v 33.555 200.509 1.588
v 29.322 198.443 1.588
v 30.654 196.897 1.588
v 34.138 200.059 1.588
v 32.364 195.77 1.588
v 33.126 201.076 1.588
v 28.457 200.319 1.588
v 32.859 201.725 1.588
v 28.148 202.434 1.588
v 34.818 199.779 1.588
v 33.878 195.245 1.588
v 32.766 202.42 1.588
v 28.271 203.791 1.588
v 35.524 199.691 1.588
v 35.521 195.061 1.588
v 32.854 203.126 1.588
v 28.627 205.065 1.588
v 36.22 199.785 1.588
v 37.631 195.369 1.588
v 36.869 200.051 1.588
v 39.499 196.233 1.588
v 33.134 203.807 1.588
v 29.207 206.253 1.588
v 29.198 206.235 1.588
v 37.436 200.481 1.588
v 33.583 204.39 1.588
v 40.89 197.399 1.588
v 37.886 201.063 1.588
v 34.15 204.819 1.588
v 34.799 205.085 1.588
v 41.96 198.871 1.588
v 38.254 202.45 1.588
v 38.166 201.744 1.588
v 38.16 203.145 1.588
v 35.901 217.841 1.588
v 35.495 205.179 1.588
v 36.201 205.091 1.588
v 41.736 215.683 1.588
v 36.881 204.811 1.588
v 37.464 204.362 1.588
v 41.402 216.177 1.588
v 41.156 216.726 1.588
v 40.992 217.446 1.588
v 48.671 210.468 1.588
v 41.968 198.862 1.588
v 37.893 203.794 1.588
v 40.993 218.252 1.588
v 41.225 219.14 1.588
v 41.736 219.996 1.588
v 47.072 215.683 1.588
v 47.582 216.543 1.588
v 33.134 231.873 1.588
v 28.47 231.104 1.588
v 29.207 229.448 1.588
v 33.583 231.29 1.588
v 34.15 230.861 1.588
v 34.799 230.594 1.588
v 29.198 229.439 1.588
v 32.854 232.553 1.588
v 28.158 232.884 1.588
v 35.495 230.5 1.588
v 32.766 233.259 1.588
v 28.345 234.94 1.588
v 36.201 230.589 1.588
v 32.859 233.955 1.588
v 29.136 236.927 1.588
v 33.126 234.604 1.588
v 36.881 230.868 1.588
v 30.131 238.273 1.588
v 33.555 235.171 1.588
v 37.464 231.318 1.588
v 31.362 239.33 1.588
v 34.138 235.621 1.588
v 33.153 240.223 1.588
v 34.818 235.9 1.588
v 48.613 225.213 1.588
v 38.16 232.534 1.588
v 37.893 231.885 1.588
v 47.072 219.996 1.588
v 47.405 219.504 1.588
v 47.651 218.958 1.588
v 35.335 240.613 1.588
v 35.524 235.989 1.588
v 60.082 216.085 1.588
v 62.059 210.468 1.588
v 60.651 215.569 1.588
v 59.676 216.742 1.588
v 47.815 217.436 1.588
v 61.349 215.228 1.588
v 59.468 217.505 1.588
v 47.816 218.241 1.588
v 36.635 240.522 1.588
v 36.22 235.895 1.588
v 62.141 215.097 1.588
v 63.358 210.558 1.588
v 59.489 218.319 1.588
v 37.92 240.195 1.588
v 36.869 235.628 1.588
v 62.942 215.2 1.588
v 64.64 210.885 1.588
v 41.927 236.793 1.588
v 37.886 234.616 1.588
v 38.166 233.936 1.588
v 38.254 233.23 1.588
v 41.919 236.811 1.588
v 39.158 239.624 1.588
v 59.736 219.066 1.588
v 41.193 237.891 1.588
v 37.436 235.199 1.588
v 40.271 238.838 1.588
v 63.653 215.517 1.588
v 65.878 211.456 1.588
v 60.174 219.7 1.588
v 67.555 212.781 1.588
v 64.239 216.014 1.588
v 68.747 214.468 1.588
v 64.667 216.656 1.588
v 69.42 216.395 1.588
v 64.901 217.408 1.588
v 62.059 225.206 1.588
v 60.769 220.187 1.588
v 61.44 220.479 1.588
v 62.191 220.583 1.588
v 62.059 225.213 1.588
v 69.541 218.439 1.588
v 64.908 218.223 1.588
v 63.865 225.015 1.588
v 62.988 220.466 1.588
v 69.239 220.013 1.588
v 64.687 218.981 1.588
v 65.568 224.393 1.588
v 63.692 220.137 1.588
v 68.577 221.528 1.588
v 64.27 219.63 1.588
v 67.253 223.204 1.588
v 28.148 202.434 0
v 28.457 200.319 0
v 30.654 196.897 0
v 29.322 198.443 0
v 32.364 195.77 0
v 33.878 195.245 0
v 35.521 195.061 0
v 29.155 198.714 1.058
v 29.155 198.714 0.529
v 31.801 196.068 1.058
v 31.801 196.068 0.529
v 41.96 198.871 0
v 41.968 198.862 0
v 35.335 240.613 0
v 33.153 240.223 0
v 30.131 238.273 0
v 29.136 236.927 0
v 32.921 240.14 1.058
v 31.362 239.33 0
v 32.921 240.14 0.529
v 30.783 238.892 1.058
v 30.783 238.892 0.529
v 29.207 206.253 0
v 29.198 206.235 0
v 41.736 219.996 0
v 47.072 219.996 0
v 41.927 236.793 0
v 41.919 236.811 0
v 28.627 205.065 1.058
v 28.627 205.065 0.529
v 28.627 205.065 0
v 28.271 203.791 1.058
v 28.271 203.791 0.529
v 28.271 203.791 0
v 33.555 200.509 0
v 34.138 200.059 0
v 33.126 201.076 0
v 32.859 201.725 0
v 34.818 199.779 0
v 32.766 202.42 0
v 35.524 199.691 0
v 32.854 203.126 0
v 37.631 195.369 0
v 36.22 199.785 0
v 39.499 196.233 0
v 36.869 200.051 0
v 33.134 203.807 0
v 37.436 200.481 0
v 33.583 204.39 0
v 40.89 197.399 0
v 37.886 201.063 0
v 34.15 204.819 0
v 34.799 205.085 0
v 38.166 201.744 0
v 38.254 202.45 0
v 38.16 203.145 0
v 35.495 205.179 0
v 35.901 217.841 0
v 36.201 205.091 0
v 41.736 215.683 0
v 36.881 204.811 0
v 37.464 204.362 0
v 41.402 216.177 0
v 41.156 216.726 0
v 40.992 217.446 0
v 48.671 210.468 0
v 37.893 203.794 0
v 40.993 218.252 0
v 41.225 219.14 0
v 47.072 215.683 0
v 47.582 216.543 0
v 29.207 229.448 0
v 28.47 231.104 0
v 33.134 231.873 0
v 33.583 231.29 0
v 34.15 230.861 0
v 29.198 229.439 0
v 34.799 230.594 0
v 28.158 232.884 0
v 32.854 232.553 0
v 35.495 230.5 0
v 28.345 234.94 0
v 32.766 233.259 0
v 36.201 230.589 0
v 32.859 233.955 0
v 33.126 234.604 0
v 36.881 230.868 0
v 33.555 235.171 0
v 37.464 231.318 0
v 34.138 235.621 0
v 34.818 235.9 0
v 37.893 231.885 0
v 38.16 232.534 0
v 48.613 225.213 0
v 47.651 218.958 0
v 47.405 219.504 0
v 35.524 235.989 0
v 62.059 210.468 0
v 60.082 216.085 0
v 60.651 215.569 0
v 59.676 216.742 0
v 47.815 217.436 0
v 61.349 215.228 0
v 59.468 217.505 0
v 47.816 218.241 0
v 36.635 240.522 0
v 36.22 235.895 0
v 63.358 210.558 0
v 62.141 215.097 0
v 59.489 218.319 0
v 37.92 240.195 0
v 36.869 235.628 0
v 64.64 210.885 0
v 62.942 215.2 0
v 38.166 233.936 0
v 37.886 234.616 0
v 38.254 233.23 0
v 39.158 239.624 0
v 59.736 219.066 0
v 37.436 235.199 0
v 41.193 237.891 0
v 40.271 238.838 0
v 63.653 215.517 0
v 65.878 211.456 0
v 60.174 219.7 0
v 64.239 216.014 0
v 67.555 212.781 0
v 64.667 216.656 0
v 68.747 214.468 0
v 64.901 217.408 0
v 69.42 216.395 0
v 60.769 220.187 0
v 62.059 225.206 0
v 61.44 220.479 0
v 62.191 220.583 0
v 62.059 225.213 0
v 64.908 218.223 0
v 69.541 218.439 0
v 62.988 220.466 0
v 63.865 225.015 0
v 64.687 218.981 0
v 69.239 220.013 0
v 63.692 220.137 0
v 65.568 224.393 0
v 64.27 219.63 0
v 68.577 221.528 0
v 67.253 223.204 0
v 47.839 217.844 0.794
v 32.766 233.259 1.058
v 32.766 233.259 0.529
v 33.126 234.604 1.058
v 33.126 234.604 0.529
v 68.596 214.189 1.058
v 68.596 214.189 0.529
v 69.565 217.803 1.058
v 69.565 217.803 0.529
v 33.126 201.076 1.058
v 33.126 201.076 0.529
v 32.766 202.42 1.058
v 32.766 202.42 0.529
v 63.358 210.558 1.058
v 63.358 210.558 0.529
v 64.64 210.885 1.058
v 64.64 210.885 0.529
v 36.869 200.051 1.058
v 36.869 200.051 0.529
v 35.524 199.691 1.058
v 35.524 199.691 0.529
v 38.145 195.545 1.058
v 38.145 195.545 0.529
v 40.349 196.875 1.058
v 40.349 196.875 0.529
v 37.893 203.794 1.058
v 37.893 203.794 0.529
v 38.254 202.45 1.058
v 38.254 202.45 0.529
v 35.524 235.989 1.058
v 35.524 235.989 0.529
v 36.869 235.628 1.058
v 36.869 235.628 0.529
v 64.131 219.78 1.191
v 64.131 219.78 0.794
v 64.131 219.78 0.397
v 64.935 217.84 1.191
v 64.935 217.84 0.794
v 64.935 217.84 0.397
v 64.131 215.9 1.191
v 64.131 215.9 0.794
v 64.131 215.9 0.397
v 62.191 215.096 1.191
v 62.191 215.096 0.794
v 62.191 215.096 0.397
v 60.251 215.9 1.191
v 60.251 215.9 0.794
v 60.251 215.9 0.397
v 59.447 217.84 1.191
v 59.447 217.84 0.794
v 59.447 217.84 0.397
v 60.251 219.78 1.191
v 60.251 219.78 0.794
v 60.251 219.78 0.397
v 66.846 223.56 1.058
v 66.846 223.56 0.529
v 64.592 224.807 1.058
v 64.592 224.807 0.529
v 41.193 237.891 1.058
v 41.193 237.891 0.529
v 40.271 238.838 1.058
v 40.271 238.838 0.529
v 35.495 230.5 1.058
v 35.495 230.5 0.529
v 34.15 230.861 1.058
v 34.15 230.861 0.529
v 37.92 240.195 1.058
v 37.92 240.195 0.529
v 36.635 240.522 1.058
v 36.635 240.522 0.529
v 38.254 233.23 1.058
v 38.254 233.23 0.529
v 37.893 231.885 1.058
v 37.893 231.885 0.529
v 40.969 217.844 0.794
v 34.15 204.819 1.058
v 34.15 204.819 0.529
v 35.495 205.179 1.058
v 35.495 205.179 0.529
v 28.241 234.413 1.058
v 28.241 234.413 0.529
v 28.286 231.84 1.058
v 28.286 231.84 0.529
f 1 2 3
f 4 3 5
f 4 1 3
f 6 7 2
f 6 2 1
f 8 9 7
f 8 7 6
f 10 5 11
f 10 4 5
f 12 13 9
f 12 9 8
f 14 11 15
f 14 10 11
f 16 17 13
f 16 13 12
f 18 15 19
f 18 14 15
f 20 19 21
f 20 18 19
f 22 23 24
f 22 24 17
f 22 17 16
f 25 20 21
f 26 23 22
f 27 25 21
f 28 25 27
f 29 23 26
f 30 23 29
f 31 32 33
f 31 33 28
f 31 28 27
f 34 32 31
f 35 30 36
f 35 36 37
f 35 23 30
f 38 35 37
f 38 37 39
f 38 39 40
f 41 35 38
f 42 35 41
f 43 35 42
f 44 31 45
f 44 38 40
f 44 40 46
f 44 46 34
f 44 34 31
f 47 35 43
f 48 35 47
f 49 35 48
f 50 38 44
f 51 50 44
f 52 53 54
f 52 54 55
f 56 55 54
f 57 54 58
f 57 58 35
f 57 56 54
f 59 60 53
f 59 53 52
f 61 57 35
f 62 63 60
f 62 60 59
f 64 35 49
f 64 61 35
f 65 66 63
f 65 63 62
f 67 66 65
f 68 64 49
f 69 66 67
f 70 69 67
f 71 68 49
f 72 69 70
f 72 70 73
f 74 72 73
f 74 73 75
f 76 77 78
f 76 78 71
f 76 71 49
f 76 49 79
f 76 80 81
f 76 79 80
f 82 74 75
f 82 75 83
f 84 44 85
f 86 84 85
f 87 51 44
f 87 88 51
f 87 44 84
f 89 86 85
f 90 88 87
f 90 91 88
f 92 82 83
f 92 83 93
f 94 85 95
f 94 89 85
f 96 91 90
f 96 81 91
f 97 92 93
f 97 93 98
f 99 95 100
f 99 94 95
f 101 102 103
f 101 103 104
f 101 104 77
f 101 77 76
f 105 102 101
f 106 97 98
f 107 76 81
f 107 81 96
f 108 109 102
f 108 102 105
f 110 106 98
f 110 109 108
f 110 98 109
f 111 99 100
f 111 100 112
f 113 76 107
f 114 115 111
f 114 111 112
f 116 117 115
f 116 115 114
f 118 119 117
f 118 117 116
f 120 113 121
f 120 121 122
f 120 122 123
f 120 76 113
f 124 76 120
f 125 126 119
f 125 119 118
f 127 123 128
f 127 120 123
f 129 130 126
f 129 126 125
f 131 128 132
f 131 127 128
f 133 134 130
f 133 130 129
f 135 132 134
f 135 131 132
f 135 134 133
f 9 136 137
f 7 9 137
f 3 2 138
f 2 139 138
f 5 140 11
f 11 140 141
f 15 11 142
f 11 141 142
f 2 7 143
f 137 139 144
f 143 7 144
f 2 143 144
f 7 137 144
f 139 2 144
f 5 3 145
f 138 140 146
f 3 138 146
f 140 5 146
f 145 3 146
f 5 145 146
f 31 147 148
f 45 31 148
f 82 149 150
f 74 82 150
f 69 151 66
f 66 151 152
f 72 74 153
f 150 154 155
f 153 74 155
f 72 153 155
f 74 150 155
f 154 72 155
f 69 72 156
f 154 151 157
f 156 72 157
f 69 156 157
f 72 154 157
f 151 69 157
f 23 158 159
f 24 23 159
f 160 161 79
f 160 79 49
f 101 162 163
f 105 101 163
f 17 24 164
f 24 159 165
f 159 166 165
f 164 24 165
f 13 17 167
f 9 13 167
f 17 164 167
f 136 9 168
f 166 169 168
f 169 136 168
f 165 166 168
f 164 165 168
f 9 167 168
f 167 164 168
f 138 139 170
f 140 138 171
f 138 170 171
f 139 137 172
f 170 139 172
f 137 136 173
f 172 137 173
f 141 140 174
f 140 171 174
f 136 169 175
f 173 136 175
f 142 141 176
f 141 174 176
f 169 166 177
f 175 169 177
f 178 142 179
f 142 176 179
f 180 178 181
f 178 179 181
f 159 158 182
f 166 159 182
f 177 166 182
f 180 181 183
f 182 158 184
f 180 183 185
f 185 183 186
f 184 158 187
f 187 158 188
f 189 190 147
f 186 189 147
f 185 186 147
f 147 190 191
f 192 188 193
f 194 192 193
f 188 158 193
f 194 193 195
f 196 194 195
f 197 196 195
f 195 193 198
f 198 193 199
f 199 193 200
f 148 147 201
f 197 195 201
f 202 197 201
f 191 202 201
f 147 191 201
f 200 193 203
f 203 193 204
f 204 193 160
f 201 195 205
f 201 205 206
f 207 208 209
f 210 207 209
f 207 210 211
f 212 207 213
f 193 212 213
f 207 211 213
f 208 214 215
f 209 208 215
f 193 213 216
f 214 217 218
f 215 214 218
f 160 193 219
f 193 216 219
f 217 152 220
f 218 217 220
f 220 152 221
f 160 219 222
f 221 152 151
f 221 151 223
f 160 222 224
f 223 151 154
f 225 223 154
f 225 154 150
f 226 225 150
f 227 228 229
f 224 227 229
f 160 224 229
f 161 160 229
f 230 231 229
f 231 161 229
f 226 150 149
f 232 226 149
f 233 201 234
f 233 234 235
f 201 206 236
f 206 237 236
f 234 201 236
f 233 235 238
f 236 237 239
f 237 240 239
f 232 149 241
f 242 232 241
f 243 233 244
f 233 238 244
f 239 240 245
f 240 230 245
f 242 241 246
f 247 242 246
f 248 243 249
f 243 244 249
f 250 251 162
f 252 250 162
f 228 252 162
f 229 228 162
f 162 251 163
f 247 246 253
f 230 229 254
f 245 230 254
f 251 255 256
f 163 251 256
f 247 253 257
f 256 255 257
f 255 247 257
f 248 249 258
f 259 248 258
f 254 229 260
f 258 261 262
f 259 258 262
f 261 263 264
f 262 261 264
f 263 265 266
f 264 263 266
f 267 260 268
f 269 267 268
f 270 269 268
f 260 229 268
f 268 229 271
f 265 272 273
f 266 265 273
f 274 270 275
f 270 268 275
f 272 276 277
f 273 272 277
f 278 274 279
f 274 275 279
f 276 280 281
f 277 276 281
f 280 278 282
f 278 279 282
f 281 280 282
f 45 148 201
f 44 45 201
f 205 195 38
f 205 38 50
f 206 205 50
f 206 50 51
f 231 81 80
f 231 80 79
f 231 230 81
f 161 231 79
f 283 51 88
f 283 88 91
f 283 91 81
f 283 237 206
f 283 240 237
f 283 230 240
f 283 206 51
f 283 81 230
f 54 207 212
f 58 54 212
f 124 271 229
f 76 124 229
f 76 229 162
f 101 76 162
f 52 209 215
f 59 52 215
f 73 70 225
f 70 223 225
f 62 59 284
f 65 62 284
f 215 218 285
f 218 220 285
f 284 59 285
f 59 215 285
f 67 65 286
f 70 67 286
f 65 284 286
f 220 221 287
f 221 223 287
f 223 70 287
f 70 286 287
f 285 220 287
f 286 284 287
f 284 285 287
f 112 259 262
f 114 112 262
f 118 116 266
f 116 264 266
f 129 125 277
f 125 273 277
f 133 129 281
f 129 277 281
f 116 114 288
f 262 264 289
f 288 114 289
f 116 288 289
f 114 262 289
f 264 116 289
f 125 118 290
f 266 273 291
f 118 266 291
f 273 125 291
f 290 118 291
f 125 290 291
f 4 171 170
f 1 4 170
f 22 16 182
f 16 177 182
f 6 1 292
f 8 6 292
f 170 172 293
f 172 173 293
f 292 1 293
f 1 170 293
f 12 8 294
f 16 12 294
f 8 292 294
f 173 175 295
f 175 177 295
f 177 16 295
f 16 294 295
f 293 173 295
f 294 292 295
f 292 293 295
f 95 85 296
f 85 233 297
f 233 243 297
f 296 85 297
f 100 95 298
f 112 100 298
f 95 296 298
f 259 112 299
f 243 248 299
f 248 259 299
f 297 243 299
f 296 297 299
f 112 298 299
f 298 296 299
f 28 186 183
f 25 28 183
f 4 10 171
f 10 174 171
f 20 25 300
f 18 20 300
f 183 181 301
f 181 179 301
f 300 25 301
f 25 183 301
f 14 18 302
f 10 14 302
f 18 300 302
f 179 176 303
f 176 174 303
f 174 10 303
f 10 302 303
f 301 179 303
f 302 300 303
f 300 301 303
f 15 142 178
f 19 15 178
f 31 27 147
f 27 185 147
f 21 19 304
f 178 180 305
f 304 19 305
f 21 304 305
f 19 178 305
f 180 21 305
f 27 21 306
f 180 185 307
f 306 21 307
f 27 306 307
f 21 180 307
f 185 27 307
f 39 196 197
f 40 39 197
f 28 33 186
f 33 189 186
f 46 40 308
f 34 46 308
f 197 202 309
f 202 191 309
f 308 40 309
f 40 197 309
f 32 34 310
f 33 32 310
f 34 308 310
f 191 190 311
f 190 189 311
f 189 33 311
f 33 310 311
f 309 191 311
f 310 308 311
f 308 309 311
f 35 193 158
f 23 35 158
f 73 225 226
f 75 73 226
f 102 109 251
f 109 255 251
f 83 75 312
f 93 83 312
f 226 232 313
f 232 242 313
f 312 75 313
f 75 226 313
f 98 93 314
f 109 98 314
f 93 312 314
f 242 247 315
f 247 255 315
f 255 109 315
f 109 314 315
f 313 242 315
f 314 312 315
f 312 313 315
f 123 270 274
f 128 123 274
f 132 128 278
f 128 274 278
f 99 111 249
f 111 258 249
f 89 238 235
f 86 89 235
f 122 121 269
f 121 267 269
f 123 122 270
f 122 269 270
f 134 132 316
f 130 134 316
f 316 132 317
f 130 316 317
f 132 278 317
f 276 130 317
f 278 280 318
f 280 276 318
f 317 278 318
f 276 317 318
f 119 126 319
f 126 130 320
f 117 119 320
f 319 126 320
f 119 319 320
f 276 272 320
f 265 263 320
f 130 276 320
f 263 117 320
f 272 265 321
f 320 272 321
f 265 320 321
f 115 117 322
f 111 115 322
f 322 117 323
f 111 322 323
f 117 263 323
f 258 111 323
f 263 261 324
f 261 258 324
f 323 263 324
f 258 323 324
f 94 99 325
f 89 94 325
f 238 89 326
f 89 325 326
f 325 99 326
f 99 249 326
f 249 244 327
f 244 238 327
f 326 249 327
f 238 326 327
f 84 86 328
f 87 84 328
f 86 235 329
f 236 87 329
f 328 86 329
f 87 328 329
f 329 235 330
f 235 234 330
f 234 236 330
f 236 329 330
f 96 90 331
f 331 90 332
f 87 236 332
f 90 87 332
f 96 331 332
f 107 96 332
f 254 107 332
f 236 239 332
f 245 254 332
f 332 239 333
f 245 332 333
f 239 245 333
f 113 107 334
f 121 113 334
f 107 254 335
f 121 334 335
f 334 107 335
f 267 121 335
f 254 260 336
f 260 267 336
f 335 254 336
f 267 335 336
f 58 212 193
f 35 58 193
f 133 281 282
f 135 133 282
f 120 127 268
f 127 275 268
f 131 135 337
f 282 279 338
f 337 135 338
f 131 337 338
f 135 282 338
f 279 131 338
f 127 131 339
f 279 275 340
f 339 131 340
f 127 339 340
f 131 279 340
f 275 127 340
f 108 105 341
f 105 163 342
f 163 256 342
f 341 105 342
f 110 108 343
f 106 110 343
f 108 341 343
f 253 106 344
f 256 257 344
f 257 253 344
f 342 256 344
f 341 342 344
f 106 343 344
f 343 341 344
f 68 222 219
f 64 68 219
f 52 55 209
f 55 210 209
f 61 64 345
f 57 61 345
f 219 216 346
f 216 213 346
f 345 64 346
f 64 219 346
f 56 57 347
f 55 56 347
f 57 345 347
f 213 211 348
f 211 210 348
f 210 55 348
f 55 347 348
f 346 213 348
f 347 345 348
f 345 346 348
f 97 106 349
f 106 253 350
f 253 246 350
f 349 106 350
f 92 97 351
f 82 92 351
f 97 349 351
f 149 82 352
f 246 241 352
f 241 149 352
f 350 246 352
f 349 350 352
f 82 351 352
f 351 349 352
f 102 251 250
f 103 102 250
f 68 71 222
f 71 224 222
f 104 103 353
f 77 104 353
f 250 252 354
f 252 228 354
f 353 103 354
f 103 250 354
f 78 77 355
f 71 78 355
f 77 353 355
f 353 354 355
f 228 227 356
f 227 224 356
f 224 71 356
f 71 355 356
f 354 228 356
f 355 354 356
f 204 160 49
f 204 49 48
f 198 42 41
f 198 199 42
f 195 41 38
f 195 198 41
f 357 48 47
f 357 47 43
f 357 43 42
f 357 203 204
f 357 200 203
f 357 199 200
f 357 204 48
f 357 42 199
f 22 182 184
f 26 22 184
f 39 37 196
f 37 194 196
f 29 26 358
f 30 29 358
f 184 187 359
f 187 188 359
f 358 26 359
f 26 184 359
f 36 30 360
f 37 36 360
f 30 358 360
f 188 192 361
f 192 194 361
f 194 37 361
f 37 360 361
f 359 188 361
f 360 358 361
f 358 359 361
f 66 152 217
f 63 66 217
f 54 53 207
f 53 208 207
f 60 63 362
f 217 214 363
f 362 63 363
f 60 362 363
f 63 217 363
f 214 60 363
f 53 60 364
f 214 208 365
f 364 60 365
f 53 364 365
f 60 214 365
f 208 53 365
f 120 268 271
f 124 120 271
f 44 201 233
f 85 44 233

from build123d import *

# Parameters (mm, degrees)
BOSS_EXTRUDE5_DEPTH = 1.5875


with BuildPart() as part:
    # carrier → Boss-Extrude5 (new body)
    with BuildSketch(Plane(origin=(-89.612357323, 67.458483608, 0), x_dir=(1, 0, 0), z_dir=(0, 0, 1))):
        with BuildLine():
            Line((118.819010038, 161.989326691), (118.810191038, 161.980520691))
            Line((118.810191038, 161.980520691), (125.512969038, 150.382951691))
            Line((125.512969038, 150.382951691), (118.819010038, 138.794201691))
            Line((118.819010038, 138.794201691), (118.810191038, 138.776562691))
            add(Edge.make_bspline(
                [(118.810191038, 138.776562691), (118.138894038, 137.665721691), (117.760677038, 136.367990691), (117.760677038, 134.975382691)],
                knots=[0, 0, 0, 0, 1, 1, 1, 1], degree=3))
            add(Edge.make_bspline(
                [(117.760677038, 134.975382691), (117.760675038, 130.905661691), (121.064010038, 127.602323691), (125.133733038, 127.602326691)],
                knots=[0, 0, 0, 0, 1, 1, 1, 1], degree=3))
            add(Edge.make_bspline(
                [(125.133733038, 127.602326691), (127.909953038, 127.602326691), (130.315556038, 129.144498691), (131.571927038, 131.412326691)],
                knots=[0, 0, 0, 0, 1, 1, 1, 1], degree=3))
            Line((131.571927038, 131.412326691), (131.580732038, 131.403521691))
            Line((131.580732038, 131.403521691), (138.283510038, 143.009910691))
            Line((138.283510038, 143.009910691), (151.653788038, 143.009910691))
            Line((151.653788038, 143.009910691), (151.671427038, 143.009910691))
            add(Edge.make_bspline(
                [(151.671427038, 143.009910691), (152.969090038, 142.983973691), (154.284212038, 143.301383691), (155.490246038, 143.997687691)],
                knots=[0, 0, 0, 0, 1, 1, 1, 1], degree=3))
            add(Edge.make_bspline(
                [(155.490246038, 143.997687691), (159.014728038, 146.032549691), (160.223858038, 150.545012691), (158.188996038, 154.069493691)],
                knots=[0, 0, 0, 0, 1, 1, 1, 1], degree=3))
            add(Edge.make_bspline(
                [(158.188996038, 154.069493691), (156.800886038, 156.473769691), (154.263610038, 157.793065691), (151.671427038, 157.747201691)],
                knots=[0, 0, 0, 0, 1, 1, 1, 1], degree=3))
            Line((151.671427038, 157.747201691), (151.671427038, 157.754849091))
            Line((151.671427038, 157.754849091), (138.224971754, 157.754849091))
            Line((138.224971754, 157.754849091), (131.539832754, 169.334779091))
            Line((131.539832754, 169.334779091), (131.531027754, 169.352418091))
            add(Edge.make_bspline(
                [(131.531027754, 169.352418091), (130.904660754, 170.489198091), (129.976575754, 171.469517091), (128.770540754, 172.165821091)],
                knots=[0, 0, 0, 0, 1, 1, 1, 1], degree=3))
            add(Edge.make_bspline(
                [(128.770540754, 172.165821091), (127.565708199, 172.861433534), (126.244241887, 173.179504317), (124.946928377, 173.154056045)],
                knots=[0, 0, 0, 0, 0.994463703, 0.994463703, 0.994463703, 0.994463703], degree=3))
            add(Edge.make_bspline(
                [(124.946928377, 173.154056045), (122.467005204, 173.088633853), (120.078815068, 171.772470761), (118.748455038, 169.468215691)],
                knots=[0.003756223, 0.003756223, 0.003756223, 0.003756223, 1, 1, 1, 1], degree=3))
            add(Edge.make_bspline(
                [(118.748455038, 169.468215691), (117.360345038, 167.063938691), (117.483199038, 164.211290691), (118.819010038, 161.989326691)],
                knots=[0, 0, 0, 0, 1, 1, 1, 1], degree=3))
        make_face()
        with BuildLine():
            Line((131.348201, 148.224924), (136.683962, 148.224924))
            add(Edge.make_bspline(
                [(136.683962, 148.224924), (137.161645, 148.814777), (137.451253, 149.56754), (137.451253, 150.385688)],
                knots=[0, 0, 0, 0, 1, 1, 1, 1], degree=3))
            add(Edge.make_bspline(
                [(137.451253, 150.385688), (137.451253, 151.203836), (137.161645, 151.94778), (136.683962, 152.537633)],
                knots=[0, 0, 0, 0, 1, 1, 1, 1], degree=3))
            Line((136.683962, 152.537633), (131.348201, 152.537633))
            add(Edge.make_bspline(
                [(131.348201, 152.537633), (130.870517, 151.94778), (130.580909, 151.203836), (130.580909, 150.385688)],
                knots=[0, 0, 0, 0, 1, 1, 1, 1], degree=3))
            add(Edge.make_bspline(
                [(130.580909, 150.385688), (130.580909, 149.56754), (130.870517, 148.814777), (131.348201, 148.224924)],
                knots=[0, 0, 0, 0, 1, 1, 1, 1], degree=3))
        make_face(mode=Mode.SUBTRACT)
        with BuildLine():
            add(Edge.make_bspline(
                [(154.547076, 150.381274), (154.547076, 148.865969), (153.318678, 147.637574), (151.803377, 147.637574)],
                knots=[0, 0, 0, 0, 1, 1, 1, 1], degree=3))
            add(Edge.make_bspline(
                [(151.803377, 147.637574), (150.288072, 147.637574), (149.059677, 148.865969), (149.059677, 150.381274)],
                knots=[0, 0, 0, 0, 1, 1, 1, 1], degree=3))
            add(Edge.make_bspline(
                [(149.059677, 150.381274), (149.059677, 151.896576), (150.288072, 153.124973), (151.803377, 153.124973)],
                knots=[0, 0, 0, 0, 1, 1, 1, 1], degree=3))
            add(Edge.make_bspline(
                [(151.803377, 153.124973), (153.318678, 153.124973), (154.547076, 151.896576), (154.547076, 150.381274)],
                knots=[0, 0, 0, 0, 1, 1, 1, 1], degree=3))
        make_face(mode=Mode.SUBTRACT)
        with BuildLine():
            add(Edge.make_bspline(
                [(123.750123, 168.162095), (125.062416, 168.919747), (126.740436, 168.470121), (127.498087, 167.157831)],
                knots=[0, 0, 0, 0, 1, 1, 1, 1], degree=3))
            add(Edge.make_bspline(
                [(127.498087, 167.157831), (128.255739, 165.845539), (127.806115, 164.16752), (126.493823, 163.409868)],
                knots=[0, 0, 0, 0, 1, 1, 1, 1], degree=3))
            add(Edge.make_bspline(
                [(126.493823, 163.409868), (125.181533, 162.652217), (123.503512, 163.101839), (122.74586, 164.414132)],
                knots=[0, 0, 0, 0, 1, 1, 1, 1], degree=3))
            add(Edge.make_bspline(
                [(122.74586, 164.414132), (121.988209, 165.726422), (122.437834, 167.404444), (123.750123, 168.162095)],
                knots=[0, 0, 0, 0, 1, 1, 1, 1], degree=3))
        make_face(mode=Mode.SUBTRACT)
        with BuildLine():
            add(Edge.make_bspline(
                [(123.750127, 132.600451), (122.437834, 133.358103), (121.988212, 135.036124), (122.745863, 136.348414)],
                knots=[0, 0, 0, 0, 1, 1, 1, 1], degree=3))
            add(Edge.make_bspline(
                [(122.745863, 136.348414), (123.503515, 137.660706), (125.181534, 138.11033), (126.493826, 137.352678)],
                knots=[0, 0, 0, 0, 1, 1, 1, 1], degree=3))
            add(Edge.make_bspline(
                [(126.493826, 137.352678), (127.806116, 136.595027), (128.255742, 134.917007), (127.49809, 133.604715)],
                knots=[0, 0, 0, 0, 1, 1, 1, 1], degree=3))
            add(Edge.make_bspline(
                [(127.49809, 133.604715), (126.740439, 132.292425), (125.062417, 131.8428), (123.750127, 132.600451)],
                knots=[0, 0, 0, 0, 1, 1, 1, 1], degree=3))
        make_face(mode=Mode.SUBTRACT)
    extrude(amount=BOSS_EXTRUDE5_DEPTH)


solid = part.part
